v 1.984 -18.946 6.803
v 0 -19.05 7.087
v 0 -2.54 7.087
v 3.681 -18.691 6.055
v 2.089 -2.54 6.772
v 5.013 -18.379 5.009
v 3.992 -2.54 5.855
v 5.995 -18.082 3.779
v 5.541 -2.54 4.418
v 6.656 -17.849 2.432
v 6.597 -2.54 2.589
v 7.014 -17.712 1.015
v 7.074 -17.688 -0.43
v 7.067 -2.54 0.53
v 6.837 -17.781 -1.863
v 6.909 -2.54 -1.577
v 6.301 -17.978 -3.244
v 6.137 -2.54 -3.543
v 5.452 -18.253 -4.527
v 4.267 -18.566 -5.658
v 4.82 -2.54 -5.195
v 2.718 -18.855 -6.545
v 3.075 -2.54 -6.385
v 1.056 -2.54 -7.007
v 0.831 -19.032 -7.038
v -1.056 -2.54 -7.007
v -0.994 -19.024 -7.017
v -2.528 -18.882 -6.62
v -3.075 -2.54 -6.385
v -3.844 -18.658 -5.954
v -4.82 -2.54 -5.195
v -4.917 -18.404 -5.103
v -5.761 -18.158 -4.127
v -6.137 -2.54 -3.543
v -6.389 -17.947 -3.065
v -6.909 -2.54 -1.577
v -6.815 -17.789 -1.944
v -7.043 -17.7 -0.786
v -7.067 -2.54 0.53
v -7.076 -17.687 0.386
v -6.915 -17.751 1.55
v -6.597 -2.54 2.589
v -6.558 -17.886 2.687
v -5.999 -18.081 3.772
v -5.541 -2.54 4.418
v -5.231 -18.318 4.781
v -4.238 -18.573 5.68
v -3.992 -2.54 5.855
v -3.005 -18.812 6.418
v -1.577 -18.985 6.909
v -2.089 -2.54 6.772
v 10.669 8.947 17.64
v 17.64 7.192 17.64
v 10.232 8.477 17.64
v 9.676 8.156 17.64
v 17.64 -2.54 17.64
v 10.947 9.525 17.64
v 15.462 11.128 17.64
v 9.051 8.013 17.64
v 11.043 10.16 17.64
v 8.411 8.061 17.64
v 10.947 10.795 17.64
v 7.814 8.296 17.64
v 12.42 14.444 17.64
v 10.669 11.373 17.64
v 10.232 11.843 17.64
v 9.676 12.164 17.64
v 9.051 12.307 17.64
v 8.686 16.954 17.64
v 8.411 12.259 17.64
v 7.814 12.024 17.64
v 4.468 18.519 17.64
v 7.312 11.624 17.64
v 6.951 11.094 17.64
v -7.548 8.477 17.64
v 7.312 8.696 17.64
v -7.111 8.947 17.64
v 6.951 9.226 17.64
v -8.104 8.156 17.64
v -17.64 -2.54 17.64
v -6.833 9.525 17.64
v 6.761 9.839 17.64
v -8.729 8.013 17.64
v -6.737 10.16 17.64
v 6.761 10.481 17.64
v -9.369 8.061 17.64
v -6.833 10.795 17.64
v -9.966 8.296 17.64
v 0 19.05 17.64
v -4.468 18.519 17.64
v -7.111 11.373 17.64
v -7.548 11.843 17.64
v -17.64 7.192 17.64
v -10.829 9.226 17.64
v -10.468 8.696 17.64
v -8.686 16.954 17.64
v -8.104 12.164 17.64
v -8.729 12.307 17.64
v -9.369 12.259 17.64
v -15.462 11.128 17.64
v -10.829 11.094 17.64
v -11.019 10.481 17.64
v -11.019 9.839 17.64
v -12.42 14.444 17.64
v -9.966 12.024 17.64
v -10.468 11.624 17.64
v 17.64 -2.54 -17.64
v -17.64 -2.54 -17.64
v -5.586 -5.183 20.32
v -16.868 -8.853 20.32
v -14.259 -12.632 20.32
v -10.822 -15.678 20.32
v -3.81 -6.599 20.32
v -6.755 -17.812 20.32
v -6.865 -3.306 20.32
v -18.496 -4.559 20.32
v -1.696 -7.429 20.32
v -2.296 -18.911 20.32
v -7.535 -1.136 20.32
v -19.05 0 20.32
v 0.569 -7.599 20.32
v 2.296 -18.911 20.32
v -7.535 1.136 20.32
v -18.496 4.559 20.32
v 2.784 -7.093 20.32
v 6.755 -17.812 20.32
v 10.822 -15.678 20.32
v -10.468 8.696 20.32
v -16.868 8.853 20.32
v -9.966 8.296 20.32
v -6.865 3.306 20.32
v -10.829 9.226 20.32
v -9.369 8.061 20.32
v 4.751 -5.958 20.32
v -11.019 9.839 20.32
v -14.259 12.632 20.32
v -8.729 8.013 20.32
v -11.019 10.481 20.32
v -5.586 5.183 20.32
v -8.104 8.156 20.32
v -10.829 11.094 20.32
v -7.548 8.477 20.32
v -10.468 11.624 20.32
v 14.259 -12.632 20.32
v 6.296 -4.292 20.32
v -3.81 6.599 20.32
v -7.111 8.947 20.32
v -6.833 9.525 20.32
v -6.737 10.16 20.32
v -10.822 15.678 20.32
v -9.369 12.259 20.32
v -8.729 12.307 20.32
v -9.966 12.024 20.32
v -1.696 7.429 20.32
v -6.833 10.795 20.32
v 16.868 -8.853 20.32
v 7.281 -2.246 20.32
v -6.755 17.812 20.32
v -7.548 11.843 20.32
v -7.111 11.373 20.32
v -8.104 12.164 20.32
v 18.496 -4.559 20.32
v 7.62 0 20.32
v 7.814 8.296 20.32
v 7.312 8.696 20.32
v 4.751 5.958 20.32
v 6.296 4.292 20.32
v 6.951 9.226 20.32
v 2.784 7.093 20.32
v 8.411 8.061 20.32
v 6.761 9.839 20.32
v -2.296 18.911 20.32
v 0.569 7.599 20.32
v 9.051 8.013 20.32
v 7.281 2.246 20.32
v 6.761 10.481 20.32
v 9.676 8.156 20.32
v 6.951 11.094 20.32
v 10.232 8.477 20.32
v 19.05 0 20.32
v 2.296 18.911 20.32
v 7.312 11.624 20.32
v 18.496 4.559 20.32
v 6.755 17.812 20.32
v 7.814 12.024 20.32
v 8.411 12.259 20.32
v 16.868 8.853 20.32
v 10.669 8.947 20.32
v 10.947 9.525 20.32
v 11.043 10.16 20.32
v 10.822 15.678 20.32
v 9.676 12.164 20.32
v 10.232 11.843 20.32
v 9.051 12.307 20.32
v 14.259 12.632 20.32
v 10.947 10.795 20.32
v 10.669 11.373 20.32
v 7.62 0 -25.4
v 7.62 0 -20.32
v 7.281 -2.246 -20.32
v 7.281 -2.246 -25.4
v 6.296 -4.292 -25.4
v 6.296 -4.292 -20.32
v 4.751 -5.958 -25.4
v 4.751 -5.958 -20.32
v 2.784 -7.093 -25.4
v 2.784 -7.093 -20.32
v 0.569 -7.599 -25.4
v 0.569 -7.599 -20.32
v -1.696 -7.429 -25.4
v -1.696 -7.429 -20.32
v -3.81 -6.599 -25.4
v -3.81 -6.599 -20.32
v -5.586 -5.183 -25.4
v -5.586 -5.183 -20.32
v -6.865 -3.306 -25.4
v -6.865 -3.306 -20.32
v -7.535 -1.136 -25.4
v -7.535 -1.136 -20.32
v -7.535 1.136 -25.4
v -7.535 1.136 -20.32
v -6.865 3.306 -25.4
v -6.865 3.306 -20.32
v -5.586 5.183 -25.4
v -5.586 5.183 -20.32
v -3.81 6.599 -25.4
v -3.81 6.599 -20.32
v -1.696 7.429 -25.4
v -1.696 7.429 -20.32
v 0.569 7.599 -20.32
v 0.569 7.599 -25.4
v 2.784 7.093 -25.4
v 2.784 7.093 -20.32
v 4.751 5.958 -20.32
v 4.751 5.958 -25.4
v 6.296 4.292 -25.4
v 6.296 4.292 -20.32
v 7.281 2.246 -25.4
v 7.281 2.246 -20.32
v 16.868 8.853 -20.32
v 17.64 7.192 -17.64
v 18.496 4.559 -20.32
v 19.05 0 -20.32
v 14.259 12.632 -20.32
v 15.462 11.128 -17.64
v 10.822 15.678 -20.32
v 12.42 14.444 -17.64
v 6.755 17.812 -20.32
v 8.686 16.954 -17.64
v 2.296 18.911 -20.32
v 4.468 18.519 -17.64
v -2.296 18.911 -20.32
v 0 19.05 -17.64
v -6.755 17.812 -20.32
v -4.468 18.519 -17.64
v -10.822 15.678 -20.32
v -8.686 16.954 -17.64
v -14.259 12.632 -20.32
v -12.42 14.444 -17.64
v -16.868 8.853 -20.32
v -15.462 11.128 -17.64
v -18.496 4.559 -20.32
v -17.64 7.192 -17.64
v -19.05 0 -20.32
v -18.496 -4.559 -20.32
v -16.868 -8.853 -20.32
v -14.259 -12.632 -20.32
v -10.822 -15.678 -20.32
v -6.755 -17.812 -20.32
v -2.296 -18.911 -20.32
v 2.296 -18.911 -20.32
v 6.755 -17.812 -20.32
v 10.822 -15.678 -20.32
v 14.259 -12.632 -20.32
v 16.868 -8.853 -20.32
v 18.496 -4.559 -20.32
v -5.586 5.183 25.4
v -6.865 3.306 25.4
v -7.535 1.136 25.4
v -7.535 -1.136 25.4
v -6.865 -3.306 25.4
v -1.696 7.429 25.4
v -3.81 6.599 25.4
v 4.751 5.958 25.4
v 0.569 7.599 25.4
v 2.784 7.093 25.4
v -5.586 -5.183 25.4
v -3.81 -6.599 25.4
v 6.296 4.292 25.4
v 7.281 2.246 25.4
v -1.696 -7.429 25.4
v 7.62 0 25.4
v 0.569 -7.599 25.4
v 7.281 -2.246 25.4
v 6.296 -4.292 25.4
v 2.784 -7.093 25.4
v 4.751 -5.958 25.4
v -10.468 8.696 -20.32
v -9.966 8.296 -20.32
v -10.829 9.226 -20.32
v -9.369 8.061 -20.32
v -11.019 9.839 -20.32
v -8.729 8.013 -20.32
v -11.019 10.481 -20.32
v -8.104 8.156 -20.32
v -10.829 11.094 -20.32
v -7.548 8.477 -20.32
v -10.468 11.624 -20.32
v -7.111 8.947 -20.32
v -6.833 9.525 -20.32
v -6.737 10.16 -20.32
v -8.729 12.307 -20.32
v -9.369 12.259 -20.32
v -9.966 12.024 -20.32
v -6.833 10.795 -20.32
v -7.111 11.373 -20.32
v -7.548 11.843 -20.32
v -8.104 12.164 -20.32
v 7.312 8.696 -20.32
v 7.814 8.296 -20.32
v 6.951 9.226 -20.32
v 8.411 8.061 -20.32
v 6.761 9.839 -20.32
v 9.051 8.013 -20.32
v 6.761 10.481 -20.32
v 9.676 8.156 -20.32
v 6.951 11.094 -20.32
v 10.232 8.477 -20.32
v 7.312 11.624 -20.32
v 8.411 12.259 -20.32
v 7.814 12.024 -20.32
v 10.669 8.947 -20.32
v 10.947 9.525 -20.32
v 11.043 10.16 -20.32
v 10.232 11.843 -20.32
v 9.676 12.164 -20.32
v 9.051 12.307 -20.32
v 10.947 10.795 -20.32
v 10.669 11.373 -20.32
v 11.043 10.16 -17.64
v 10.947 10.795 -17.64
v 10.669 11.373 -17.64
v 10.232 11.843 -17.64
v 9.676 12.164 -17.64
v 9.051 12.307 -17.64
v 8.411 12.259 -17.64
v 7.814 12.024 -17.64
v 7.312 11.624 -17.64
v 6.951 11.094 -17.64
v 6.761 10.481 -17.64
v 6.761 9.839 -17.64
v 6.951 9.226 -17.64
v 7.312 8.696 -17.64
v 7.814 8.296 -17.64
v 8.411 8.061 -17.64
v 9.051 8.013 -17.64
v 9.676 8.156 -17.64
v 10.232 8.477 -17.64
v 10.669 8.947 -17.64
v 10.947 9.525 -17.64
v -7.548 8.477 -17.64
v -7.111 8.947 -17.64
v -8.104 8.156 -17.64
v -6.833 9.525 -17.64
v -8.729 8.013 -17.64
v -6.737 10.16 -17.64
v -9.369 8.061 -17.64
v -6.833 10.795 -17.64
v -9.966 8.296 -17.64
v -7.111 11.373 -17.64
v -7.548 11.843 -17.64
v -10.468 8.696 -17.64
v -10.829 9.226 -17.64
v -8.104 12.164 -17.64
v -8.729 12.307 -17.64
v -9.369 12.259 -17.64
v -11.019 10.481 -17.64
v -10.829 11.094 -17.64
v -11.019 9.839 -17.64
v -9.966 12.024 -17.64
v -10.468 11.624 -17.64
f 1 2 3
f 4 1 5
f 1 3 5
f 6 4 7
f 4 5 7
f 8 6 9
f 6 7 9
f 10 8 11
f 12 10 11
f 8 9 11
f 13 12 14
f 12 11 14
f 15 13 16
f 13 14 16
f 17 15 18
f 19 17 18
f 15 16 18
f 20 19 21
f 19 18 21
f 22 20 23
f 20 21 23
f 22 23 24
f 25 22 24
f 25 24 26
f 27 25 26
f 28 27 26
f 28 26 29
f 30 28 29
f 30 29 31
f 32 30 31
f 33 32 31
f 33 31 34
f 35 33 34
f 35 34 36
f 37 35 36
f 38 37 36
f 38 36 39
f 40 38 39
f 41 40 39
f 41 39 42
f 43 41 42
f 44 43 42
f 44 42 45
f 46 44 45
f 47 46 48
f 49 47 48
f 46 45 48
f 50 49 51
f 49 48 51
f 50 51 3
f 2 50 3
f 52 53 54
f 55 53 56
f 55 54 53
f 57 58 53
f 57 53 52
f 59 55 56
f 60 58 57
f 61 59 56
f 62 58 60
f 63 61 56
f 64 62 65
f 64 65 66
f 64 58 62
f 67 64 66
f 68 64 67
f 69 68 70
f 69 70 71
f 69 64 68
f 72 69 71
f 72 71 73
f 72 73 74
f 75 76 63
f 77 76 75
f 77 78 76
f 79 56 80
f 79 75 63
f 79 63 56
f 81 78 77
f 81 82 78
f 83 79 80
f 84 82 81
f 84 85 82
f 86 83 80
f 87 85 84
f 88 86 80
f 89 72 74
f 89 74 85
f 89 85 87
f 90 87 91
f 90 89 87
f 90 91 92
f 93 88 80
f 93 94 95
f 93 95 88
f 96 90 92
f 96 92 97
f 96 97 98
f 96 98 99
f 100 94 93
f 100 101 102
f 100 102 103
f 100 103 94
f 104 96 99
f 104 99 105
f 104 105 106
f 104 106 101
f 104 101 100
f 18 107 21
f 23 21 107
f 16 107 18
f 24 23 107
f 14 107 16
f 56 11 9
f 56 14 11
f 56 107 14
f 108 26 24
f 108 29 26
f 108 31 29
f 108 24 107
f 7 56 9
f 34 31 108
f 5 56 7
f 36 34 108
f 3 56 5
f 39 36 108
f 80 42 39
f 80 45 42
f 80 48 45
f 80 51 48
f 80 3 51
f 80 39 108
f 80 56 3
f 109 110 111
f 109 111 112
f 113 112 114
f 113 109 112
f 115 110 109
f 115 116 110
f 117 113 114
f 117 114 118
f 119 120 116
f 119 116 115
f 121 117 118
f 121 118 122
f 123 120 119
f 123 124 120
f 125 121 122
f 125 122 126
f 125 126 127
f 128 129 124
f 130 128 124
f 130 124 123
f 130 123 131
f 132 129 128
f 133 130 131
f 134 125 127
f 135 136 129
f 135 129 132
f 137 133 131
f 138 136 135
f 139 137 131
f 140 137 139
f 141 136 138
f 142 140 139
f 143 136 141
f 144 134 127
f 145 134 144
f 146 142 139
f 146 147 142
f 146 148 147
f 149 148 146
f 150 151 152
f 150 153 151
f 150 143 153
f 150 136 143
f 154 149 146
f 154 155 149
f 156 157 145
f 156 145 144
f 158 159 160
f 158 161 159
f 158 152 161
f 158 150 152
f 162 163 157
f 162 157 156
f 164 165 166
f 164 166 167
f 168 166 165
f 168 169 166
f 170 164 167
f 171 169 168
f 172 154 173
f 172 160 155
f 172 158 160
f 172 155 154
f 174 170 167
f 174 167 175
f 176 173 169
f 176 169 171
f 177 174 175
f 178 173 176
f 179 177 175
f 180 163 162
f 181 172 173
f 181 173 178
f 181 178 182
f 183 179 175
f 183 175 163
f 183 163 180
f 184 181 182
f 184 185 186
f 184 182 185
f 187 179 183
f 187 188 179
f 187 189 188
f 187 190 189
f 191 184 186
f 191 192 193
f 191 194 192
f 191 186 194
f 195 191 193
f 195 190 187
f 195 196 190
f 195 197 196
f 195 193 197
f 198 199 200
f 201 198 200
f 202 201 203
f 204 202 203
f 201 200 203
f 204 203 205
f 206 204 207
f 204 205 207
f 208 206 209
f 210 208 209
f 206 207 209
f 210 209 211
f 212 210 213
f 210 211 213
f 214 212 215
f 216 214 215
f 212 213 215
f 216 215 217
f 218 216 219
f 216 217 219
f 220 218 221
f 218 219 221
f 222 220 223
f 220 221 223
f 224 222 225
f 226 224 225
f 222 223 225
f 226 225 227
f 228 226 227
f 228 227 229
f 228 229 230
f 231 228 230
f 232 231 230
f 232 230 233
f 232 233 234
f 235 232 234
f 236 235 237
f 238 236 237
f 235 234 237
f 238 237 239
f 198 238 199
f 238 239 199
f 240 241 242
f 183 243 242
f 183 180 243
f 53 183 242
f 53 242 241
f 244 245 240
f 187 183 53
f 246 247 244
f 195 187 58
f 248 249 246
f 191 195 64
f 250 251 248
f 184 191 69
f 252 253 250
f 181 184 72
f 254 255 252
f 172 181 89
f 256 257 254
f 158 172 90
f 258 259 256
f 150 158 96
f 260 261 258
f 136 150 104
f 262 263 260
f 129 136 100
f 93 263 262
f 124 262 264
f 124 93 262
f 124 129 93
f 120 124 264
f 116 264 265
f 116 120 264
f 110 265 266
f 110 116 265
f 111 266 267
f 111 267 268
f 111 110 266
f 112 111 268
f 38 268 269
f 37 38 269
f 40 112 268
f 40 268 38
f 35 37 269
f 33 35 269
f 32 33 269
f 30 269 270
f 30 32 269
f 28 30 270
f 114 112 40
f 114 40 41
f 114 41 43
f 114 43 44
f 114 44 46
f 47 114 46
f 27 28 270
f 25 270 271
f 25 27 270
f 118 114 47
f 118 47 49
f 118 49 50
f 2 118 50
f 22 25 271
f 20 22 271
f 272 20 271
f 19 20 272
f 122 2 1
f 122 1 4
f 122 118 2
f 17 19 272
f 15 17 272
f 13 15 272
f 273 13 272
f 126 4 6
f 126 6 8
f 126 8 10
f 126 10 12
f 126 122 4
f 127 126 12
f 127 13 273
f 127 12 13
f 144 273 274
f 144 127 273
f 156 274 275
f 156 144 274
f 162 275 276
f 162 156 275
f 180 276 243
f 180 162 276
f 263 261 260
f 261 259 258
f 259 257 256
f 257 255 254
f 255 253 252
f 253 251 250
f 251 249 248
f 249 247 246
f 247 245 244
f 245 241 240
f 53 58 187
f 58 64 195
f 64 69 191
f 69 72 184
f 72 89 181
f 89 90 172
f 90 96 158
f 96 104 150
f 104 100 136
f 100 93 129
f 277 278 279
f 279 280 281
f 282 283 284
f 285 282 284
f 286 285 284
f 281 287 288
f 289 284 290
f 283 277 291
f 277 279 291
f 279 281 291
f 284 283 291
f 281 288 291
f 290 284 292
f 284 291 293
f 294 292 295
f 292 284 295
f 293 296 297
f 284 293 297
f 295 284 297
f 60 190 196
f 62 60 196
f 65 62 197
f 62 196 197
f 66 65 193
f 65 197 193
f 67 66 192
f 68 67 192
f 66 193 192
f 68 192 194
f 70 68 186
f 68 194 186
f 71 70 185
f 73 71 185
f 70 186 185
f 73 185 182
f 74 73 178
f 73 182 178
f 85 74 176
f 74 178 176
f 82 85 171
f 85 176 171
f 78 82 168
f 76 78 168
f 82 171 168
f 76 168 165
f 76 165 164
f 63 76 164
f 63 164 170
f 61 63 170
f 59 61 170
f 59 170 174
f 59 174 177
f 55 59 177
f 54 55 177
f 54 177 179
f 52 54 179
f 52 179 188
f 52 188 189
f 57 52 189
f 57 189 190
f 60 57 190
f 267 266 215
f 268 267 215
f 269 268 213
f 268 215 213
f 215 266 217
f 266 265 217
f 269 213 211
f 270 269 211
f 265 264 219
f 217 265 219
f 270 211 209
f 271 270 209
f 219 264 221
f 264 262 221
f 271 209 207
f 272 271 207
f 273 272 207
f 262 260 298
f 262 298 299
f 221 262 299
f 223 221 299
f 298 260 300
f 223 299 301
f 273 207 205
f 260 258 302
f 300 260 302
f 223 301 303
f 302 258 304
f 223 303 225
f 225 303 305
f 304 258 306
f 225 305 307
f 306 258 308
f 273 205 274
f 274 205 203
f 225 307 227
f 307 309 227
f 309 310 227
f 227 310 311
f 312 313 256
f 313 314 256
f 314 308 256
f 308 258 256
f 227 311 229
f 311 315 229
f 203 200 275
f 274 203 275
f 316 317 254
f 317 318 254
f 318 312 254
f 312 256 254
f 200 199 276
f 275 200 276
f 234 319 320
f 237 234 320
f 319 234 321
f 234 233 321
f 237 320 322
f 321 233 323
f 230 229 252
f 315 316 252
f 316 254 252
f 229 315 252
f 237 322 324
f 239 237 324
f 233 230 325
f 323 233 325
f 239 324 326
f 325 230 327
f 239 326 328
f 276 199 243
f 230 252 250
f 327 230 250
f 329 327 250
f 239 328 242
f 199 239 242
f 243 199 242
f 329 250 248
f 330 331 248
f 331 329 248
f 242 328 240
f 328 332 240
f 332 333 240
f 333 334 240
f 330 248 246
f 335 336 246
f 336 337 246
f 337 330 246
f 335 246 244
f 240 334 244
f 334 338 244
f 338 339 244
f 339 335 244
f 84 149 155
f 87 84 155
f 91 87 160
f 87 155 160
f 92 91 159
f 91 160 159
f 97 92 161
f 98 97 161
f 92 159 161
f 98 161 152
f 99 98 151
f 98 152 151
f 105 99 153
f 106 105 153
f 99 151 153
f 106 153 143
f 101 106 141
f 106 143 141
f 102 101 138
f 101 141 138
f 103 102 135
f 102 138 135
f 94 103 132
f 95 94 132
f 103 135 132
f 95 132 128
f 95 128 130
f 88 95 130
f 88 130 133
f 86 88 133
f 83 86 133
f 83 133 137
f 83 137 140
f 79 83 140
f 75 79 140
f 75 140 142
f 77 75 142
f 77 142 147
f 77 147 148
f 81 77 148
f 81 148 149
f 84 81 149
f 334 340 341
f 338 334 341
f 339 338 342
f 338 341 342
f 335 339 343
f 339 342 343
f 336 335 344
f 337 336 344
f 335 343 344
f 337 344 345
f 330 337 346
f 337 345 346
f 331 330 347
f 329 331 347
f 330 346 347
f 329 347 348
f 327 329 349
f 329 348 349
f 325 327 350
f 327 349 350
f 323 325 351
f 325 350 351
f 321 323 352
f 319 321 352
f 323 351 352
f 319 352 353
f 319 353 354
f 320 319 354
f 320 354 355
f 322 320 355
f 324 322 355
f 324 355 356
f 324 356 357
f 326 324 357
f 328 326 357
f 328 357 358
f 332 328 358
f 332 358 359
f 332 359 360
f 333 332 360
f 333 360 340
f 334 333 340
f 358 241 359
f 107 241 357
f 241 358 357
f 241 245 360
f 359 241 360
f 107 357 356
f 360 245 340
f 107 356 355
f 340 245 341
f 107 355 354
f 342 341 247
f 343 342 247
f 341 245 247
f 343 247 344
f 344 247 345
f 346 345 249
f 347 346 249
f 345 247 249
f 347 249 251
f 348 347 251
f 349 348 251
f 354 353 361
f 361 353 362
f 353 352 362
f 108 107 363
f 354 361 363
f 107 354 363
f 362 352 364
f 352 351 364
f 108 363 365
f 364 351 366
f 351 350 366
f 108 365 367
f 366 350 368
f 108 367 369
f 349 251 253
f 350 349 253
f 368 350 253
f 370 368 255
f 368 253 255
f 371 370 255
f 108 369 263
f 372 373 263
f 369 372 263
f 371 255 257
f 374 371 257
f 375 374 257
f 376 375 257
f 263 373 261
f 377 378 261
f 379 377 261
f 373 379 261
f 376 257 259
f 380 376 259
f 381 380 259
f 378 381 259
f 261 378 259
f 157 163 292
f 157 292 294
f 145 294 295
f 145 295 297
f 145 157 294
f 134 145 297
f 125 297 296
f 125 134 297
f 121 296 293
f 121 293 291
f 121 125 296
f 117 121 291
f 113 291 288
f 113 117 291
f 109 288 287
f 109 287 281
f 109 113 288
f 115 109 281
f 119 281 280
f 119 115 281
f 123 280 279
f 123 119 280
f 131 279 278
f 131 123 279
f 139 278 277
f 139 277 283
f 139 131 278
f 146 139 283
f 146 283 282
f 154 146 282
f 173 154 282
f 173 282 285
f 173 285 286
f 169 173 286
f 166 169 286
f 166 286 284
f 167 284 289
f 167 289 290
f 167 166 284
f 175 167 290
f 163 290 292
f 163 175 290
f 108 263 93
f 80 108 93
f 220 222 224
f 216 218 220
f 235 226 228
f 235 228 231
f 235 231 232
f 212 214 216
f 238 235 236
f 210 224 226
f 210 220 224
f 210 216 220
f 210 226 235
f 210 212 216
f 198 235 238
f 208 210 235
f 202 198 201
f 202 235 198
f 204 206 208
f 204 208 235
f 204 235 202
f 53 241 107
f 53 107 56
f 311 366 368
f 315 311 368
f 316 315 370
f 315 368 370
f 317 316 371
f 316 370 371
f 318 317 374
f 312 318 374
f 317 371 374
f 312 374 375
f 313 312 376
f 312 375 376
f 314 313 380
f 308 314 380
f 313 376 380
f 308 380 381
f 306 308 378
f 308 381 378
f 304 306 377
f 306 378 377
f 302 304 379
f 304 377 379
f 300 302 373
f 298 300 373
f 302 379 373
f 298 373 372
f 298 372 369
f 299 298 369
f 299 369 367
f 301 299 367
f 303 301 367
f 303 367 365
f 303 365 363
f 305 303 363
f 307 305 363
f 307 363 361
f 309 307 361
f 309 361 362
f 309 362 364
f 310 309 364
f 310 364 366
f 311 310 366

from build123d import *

# Parameters (mm, degrees)
SKETCH2_R             = 19.05
EXTRUDE1_DEPTH        = 20.32
SKETCH4_W             = 35.2806
SKETCH4_H             = 35.2806
EXTRUDE2_DEPTH        = 21.59
SKETCH5_R             = 7.0866
EXTRUDE3_DEPTH        = 36.241069791
SKETCH7_R             = 7.62
EXTRUDE4_DEPTH        = 5.08
F_8_CLEARANCE_HOLE1_D = 4.3053


with BuildPart() as part:
    # Sketch2 → Extrude1 (new, symmetric)
    with BuildSketch(Plane.XY):
        Circle(SKETCH2_R)
    extrude(amount=EXTRUDE1_DEPTH, both=True)

    # Sketch4 → Extrude2 (cut)
    with BuildSketch(Plane(origin=(0, 19.05, 20.32), x_dir=(-1, 0, 0), z_dir=(0, 1, 0))):
        with Locations((0, -20.32)):
            Rectangle(SKETCH4_W, SKETCH4_H)
    extrude(amount=-EXTRUDE2_DEPTH, mode=Mode.SUBTRACT)

    # Sketch5 → Extrude3 (cut, through all)
    with BuildSketch(Plane(origin=(0, -2.54, 0), x_dir=(1, 0, 0), z_dir=(0, 1, 0))):
        with Locations(Location((0, 0, 0), (0, 0, 270))):
            Circle(SKETCH5_R)
    extrude(amount=-EXTRUDE3_DEPTH, mode=Mode.SUBTRACT)

    # Sketch7 → Extrude4 (add)
    with BuildSketch(Plane(origin=(0, 0, -20.32), x_dir=(-1, 0, 0), z_dir=(0, 0, -1))):
        with Locations(Location((0, 0, 0), (0, 0, 180))):
            Circle(SKETCH7_R)
    extrude4 = extrude(amount=EXTRUDE4_DEPTH)

    # Mirror1: Extrude4 across plane
    add(extrude4.mirror(Plane.XY))

    # #8 Clearance Hole1 (through all)
    with Locations(Plane(origin=(0, 0, -20.32), x_dir=(-1, 0, 0), z_dir=(0, 0, -1))):
        with Locations((-8.89, 10.16), (8.89, 10.16)):
            Hole(F_8_CLEARANCE_HOLE1_D / 2)


solid = part.part
